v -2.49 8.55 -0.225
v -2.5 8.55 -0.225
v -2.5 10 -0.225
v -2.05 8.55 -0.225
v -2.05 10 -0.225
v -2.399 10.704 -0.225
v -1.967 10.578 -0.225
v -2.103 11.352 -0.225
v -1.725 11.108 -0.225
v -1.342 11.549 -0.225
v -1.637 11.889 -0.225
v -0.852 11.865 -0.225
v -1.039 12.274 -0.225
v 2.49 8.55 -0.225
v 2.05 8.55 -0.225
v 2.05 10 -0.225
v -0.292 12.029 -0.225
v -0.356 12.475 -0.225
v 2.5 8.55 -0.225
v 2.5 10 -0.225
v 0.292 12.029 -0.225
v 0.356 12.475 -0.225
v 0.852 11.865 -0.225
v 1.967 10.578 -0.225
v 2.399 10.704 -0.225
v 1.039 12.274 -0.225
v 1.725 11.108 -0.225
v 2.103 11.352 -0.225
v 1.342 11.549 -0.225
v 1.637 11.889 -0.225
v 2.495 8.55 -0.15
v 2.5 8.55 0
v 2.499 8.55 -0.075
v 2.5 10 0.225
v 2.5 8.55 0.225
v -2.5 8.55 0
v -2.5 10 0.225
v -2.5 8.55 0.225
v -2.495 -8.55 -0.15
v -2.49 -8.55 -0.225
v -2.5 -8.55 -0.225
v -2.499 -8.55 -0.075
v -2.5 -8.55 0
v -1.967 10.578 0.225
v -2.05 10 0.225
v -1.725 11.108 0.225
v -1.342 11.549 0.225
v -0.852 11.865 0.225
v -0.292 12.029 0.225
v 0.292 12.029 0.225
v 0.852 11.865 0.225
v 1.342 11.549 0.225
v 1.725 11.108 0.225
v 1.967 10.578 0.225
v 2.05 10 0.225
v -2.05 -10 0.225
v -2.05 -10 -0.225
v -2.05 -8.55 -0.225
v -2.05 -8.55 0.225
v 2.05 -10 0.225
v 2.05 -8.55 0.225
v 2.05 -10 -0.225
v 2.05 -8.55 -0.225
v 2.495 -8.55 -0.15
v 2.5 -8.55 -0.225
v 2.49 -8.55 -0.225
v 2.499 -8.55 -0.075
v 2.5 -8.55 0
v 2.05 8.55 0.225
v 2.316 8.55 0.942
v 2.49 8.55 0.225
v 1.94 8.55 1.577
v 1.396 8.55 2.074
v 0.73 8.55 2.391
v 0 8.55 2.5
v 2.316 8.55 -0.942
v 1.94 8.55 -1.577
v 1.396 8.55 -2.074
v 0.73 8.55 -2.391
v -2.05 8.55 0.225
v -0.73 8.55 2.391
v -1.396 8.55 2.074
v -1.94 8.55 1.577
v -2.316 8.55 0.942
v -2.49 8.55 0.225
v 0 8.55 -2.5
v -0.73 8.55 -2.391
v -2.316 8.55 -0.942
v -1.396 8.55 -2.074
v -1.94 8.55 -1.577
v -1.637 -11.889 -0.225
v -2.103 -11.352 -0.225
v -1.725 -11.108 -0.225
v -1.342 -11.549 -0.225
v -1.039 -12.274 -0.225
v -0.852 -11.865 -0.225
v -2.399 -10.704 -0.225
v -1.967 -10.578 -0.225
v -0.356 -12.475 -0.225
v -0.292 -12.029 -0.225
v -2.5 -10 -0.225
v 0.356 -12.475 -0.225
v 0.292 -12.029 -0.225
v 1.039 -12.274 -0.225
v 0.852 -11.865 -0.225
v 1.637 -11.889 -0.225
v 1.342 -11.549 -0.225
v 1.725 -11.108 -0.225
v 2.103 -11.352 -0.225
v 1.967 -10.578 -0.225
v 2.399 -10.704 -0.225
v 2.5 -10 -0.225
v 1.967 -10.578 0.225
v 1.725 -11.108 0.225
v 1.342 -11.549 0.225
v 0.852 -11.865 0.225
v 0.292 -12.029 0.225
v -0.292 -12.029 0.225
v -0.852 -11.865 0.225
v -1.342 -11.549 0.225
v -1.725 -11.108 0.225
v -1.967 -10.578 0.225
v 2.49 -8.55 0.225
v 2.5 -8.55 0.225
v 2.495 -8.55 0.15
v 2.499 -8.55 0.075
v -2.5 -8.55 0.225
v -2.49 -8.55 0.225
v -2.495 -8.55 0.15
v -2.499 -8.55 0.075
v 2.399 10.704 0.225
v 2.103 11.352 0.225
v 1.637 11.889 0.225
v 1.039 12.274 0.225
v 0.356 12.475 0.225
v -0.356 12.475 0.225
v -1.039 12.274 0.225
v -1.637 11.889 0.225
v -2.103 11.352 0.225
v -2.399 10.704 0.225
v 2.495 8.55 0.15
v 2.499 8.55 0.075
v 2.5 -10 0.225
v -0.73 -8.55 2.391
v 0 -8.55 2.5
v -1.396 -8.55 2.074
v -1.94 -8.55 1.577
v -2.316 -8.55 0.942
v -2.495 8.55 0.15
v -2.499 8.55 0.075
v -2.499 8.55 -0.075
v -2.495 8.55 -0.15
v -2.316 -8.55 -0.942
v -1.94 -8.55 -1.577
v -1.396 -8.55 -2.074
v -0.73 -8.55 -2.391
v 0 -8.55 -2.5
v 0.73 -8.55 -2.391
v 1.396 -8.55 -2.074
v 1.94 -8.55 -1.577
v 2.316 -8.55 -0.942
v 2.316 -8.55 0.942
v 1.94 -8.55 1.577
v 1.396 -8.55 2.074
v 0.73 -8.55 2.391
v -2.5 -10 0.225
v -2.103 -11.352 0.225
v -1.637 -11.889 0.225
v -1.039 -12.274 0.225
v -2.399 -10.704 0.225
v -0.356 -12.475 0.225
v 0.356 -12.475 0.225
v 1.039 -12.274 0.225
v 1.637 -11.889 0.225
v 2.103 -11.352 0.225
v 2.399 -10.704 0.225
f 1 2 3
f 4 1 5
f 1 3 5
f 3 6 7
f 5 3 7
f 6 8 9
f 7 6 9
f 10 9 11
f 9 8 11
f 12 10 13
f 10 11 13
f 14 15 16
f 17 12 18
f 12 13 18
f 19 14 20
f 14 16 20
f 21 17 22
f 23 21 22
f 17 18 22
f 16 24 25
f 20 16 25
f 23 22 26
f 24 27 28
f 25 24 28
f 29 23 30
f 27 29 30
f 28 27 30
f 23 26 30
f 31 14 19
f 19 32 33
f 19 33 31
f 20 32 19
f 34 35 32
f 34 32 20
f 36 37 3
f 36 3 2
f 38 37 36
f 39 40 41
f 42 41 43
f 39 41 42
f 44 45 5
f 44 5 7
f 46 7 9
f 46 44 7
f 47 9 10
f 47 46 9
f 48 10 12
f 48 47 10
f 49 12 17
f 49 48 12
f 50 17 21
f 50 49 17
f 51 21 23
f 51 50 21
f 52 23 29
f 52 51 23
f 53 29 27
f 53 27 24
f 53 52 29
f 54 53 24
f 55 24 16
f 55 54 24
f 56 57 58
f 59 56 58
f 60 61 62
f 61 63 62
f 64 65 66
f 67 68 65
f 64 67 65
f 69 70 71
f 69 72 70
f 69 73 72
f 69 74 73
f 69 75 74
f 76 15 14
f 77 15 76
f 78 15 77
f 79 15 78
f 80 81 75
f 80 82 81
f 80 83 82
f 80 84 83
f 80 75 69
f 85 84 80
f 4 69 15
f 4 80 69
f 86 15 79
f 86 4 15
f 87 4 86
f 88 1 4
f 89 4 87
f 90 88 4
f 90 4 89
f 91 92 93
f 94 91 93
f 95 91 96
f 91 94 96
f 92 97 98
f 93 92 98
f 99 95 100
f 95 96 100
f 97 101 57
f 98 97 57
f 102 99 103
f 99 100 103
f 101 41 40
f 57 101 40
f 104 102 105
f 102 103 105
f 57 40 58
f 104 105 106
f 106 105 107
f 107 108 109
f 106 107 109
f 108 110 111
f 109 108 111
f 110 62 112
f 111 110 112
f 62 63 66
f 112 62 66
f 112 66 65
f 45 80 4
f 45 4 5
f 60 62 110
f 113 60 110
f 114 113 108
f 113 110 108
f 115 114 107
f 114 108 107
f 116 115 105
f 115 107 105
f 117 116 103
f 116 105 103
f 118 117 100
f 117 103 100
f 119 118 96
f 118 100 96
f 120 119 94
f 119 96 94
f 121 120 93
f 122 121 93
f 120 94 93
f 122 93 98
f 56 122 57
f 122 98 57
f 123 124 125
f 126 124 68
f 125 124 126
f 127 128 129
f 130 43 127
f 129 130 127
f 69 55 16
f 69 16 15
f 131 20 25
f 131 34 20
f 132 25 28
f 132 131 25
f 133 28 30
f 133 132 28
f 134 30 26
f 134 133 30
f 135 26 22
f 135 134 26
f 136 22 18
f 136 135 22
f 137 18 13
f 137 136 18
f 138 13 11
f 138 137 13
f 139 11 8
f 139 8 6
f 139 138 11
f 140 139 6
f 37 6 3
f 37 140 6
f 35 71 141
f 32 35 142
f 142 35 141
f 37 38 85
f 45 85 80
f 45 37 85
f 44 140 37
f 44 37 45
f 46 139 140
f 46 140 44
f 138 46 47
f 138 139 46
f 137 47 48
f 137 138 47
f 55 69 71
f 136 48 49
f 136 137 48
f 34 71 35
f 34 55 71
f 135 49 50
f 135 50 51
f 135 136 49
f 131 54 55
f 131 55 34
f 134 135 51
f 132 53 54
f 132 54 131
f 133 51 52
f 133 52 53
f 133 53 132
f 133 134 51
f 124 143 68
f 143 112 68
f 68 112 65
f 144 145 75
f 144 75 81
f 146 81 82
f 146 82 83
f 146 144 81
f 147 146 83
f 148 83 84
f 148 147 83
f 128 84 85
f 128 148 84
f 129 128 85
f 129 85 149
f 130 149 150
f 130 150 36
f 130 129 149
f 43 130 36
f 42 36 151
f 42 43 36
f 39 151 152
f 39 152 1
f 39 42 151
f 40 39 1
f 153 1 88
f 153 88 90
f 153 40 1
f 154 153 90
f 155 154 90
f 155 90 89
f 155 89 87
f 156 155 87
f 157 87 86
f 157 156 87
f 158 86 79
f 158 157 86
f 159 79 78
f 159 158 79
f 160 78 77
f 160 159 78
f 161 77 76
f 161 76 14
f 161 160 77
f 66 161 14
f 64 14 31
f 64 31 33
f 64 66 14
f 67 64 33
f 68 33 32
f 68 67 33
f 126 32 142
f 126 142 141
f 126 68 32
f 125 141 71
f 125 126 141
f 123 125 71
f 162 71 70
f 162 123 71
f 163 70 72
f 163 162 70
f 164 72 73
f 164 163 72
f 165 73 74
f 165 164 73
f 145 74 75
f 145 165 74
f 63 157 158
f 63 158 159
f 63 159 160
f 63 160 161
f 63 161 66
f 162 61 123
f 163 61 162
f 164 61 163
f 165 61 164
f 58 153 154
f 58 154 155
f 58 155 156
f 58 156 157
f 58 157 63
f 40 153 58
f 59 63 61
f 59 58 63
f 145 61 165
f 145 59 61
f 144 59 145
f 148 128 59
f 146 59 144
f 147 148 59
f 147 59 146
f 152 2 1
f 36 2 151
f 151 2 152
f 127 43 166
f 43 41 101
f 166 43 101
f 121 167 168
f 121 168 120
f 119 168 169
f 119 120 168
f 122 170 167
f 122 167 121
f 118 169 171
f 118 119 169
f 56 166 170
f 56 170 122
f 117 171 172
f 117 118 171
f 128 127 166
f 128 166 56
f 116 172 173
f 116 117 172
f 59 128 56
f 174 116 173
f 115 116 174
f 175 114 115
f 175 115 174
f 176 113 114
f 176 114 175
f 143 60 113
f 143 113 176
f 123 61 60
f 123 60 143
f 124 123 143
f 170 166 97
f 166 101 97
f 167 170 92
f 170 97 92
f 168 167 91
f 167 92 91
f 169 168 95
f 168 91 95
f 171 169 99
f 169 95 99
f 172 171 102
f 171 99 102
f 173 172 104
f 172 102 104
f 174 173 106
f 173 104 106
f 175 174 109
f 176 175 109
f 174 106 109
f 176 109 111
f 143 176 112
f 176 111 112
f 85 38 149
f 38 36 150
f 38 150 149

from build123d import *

# Parameters (mm, degrees)
BOSS_EXTRU_1_DEPTH = 0.225


with BuildPart() as part:
    # Esquisse8 → Révolution2 (revolve)
    with BuildSketch(Plane.XY):
        Polygon((-2.05, 8.55), (-2.5, 8.55), (-2.5, -8.55), (-2.05, -8.55), (0, -8.55), (0, 8.55), align=None)
    revolve(axis=Axis((0, 8.55, 0), (0, -1, 0)))

    # Esquisse8<4> → Boss.-Extru.1 (add, symmetric)
    with BuildSketch(Plane.XY):
        with BuildLine():
            ThreePointArc((2.5, 10), (0, 12.5), (-2.5, 10))
            Line((-2.5, 10), (-2.5, 8.55))
            Line((-2.5, 8.55), (-2.05, 8.55))
            Line((-2.05, 8.55), (-2.05, 10))
            ThreePointArc((-2.05, 10), (0, 12.05), (2.05, 10))
            Line((2.05, 10), (2.05, 8.55))
            Line((2.05, 8.55), (2.5, 8.55))
            Line((2.5, 8.55), (2.5, 10))
        make_face()
        with BuildLine():
            Line((-2.05, -8.55), (-2.5, -8.55))
            Line((-2.5, -8.55), (-2.5, -10))
            ThreePointArc((-2.5, -10), (0, -12.5), (2.5, -10))
            Line((2.5, -10), (2.5, -8.55))
            Line((2.5, -8.55), (2.05, -8.55))
            Line((2.05, -8.55), (2.05, -10))
            ThreePointArc((2.05, -10), (0, -12.05), (-2.05, -10))
            Line((-2.05, -10), (-2.05, -8.55))
        make_face()
    extrude(amount=BOSS_EXTRU_1_DEPTH, both=True)


solid = part.part
